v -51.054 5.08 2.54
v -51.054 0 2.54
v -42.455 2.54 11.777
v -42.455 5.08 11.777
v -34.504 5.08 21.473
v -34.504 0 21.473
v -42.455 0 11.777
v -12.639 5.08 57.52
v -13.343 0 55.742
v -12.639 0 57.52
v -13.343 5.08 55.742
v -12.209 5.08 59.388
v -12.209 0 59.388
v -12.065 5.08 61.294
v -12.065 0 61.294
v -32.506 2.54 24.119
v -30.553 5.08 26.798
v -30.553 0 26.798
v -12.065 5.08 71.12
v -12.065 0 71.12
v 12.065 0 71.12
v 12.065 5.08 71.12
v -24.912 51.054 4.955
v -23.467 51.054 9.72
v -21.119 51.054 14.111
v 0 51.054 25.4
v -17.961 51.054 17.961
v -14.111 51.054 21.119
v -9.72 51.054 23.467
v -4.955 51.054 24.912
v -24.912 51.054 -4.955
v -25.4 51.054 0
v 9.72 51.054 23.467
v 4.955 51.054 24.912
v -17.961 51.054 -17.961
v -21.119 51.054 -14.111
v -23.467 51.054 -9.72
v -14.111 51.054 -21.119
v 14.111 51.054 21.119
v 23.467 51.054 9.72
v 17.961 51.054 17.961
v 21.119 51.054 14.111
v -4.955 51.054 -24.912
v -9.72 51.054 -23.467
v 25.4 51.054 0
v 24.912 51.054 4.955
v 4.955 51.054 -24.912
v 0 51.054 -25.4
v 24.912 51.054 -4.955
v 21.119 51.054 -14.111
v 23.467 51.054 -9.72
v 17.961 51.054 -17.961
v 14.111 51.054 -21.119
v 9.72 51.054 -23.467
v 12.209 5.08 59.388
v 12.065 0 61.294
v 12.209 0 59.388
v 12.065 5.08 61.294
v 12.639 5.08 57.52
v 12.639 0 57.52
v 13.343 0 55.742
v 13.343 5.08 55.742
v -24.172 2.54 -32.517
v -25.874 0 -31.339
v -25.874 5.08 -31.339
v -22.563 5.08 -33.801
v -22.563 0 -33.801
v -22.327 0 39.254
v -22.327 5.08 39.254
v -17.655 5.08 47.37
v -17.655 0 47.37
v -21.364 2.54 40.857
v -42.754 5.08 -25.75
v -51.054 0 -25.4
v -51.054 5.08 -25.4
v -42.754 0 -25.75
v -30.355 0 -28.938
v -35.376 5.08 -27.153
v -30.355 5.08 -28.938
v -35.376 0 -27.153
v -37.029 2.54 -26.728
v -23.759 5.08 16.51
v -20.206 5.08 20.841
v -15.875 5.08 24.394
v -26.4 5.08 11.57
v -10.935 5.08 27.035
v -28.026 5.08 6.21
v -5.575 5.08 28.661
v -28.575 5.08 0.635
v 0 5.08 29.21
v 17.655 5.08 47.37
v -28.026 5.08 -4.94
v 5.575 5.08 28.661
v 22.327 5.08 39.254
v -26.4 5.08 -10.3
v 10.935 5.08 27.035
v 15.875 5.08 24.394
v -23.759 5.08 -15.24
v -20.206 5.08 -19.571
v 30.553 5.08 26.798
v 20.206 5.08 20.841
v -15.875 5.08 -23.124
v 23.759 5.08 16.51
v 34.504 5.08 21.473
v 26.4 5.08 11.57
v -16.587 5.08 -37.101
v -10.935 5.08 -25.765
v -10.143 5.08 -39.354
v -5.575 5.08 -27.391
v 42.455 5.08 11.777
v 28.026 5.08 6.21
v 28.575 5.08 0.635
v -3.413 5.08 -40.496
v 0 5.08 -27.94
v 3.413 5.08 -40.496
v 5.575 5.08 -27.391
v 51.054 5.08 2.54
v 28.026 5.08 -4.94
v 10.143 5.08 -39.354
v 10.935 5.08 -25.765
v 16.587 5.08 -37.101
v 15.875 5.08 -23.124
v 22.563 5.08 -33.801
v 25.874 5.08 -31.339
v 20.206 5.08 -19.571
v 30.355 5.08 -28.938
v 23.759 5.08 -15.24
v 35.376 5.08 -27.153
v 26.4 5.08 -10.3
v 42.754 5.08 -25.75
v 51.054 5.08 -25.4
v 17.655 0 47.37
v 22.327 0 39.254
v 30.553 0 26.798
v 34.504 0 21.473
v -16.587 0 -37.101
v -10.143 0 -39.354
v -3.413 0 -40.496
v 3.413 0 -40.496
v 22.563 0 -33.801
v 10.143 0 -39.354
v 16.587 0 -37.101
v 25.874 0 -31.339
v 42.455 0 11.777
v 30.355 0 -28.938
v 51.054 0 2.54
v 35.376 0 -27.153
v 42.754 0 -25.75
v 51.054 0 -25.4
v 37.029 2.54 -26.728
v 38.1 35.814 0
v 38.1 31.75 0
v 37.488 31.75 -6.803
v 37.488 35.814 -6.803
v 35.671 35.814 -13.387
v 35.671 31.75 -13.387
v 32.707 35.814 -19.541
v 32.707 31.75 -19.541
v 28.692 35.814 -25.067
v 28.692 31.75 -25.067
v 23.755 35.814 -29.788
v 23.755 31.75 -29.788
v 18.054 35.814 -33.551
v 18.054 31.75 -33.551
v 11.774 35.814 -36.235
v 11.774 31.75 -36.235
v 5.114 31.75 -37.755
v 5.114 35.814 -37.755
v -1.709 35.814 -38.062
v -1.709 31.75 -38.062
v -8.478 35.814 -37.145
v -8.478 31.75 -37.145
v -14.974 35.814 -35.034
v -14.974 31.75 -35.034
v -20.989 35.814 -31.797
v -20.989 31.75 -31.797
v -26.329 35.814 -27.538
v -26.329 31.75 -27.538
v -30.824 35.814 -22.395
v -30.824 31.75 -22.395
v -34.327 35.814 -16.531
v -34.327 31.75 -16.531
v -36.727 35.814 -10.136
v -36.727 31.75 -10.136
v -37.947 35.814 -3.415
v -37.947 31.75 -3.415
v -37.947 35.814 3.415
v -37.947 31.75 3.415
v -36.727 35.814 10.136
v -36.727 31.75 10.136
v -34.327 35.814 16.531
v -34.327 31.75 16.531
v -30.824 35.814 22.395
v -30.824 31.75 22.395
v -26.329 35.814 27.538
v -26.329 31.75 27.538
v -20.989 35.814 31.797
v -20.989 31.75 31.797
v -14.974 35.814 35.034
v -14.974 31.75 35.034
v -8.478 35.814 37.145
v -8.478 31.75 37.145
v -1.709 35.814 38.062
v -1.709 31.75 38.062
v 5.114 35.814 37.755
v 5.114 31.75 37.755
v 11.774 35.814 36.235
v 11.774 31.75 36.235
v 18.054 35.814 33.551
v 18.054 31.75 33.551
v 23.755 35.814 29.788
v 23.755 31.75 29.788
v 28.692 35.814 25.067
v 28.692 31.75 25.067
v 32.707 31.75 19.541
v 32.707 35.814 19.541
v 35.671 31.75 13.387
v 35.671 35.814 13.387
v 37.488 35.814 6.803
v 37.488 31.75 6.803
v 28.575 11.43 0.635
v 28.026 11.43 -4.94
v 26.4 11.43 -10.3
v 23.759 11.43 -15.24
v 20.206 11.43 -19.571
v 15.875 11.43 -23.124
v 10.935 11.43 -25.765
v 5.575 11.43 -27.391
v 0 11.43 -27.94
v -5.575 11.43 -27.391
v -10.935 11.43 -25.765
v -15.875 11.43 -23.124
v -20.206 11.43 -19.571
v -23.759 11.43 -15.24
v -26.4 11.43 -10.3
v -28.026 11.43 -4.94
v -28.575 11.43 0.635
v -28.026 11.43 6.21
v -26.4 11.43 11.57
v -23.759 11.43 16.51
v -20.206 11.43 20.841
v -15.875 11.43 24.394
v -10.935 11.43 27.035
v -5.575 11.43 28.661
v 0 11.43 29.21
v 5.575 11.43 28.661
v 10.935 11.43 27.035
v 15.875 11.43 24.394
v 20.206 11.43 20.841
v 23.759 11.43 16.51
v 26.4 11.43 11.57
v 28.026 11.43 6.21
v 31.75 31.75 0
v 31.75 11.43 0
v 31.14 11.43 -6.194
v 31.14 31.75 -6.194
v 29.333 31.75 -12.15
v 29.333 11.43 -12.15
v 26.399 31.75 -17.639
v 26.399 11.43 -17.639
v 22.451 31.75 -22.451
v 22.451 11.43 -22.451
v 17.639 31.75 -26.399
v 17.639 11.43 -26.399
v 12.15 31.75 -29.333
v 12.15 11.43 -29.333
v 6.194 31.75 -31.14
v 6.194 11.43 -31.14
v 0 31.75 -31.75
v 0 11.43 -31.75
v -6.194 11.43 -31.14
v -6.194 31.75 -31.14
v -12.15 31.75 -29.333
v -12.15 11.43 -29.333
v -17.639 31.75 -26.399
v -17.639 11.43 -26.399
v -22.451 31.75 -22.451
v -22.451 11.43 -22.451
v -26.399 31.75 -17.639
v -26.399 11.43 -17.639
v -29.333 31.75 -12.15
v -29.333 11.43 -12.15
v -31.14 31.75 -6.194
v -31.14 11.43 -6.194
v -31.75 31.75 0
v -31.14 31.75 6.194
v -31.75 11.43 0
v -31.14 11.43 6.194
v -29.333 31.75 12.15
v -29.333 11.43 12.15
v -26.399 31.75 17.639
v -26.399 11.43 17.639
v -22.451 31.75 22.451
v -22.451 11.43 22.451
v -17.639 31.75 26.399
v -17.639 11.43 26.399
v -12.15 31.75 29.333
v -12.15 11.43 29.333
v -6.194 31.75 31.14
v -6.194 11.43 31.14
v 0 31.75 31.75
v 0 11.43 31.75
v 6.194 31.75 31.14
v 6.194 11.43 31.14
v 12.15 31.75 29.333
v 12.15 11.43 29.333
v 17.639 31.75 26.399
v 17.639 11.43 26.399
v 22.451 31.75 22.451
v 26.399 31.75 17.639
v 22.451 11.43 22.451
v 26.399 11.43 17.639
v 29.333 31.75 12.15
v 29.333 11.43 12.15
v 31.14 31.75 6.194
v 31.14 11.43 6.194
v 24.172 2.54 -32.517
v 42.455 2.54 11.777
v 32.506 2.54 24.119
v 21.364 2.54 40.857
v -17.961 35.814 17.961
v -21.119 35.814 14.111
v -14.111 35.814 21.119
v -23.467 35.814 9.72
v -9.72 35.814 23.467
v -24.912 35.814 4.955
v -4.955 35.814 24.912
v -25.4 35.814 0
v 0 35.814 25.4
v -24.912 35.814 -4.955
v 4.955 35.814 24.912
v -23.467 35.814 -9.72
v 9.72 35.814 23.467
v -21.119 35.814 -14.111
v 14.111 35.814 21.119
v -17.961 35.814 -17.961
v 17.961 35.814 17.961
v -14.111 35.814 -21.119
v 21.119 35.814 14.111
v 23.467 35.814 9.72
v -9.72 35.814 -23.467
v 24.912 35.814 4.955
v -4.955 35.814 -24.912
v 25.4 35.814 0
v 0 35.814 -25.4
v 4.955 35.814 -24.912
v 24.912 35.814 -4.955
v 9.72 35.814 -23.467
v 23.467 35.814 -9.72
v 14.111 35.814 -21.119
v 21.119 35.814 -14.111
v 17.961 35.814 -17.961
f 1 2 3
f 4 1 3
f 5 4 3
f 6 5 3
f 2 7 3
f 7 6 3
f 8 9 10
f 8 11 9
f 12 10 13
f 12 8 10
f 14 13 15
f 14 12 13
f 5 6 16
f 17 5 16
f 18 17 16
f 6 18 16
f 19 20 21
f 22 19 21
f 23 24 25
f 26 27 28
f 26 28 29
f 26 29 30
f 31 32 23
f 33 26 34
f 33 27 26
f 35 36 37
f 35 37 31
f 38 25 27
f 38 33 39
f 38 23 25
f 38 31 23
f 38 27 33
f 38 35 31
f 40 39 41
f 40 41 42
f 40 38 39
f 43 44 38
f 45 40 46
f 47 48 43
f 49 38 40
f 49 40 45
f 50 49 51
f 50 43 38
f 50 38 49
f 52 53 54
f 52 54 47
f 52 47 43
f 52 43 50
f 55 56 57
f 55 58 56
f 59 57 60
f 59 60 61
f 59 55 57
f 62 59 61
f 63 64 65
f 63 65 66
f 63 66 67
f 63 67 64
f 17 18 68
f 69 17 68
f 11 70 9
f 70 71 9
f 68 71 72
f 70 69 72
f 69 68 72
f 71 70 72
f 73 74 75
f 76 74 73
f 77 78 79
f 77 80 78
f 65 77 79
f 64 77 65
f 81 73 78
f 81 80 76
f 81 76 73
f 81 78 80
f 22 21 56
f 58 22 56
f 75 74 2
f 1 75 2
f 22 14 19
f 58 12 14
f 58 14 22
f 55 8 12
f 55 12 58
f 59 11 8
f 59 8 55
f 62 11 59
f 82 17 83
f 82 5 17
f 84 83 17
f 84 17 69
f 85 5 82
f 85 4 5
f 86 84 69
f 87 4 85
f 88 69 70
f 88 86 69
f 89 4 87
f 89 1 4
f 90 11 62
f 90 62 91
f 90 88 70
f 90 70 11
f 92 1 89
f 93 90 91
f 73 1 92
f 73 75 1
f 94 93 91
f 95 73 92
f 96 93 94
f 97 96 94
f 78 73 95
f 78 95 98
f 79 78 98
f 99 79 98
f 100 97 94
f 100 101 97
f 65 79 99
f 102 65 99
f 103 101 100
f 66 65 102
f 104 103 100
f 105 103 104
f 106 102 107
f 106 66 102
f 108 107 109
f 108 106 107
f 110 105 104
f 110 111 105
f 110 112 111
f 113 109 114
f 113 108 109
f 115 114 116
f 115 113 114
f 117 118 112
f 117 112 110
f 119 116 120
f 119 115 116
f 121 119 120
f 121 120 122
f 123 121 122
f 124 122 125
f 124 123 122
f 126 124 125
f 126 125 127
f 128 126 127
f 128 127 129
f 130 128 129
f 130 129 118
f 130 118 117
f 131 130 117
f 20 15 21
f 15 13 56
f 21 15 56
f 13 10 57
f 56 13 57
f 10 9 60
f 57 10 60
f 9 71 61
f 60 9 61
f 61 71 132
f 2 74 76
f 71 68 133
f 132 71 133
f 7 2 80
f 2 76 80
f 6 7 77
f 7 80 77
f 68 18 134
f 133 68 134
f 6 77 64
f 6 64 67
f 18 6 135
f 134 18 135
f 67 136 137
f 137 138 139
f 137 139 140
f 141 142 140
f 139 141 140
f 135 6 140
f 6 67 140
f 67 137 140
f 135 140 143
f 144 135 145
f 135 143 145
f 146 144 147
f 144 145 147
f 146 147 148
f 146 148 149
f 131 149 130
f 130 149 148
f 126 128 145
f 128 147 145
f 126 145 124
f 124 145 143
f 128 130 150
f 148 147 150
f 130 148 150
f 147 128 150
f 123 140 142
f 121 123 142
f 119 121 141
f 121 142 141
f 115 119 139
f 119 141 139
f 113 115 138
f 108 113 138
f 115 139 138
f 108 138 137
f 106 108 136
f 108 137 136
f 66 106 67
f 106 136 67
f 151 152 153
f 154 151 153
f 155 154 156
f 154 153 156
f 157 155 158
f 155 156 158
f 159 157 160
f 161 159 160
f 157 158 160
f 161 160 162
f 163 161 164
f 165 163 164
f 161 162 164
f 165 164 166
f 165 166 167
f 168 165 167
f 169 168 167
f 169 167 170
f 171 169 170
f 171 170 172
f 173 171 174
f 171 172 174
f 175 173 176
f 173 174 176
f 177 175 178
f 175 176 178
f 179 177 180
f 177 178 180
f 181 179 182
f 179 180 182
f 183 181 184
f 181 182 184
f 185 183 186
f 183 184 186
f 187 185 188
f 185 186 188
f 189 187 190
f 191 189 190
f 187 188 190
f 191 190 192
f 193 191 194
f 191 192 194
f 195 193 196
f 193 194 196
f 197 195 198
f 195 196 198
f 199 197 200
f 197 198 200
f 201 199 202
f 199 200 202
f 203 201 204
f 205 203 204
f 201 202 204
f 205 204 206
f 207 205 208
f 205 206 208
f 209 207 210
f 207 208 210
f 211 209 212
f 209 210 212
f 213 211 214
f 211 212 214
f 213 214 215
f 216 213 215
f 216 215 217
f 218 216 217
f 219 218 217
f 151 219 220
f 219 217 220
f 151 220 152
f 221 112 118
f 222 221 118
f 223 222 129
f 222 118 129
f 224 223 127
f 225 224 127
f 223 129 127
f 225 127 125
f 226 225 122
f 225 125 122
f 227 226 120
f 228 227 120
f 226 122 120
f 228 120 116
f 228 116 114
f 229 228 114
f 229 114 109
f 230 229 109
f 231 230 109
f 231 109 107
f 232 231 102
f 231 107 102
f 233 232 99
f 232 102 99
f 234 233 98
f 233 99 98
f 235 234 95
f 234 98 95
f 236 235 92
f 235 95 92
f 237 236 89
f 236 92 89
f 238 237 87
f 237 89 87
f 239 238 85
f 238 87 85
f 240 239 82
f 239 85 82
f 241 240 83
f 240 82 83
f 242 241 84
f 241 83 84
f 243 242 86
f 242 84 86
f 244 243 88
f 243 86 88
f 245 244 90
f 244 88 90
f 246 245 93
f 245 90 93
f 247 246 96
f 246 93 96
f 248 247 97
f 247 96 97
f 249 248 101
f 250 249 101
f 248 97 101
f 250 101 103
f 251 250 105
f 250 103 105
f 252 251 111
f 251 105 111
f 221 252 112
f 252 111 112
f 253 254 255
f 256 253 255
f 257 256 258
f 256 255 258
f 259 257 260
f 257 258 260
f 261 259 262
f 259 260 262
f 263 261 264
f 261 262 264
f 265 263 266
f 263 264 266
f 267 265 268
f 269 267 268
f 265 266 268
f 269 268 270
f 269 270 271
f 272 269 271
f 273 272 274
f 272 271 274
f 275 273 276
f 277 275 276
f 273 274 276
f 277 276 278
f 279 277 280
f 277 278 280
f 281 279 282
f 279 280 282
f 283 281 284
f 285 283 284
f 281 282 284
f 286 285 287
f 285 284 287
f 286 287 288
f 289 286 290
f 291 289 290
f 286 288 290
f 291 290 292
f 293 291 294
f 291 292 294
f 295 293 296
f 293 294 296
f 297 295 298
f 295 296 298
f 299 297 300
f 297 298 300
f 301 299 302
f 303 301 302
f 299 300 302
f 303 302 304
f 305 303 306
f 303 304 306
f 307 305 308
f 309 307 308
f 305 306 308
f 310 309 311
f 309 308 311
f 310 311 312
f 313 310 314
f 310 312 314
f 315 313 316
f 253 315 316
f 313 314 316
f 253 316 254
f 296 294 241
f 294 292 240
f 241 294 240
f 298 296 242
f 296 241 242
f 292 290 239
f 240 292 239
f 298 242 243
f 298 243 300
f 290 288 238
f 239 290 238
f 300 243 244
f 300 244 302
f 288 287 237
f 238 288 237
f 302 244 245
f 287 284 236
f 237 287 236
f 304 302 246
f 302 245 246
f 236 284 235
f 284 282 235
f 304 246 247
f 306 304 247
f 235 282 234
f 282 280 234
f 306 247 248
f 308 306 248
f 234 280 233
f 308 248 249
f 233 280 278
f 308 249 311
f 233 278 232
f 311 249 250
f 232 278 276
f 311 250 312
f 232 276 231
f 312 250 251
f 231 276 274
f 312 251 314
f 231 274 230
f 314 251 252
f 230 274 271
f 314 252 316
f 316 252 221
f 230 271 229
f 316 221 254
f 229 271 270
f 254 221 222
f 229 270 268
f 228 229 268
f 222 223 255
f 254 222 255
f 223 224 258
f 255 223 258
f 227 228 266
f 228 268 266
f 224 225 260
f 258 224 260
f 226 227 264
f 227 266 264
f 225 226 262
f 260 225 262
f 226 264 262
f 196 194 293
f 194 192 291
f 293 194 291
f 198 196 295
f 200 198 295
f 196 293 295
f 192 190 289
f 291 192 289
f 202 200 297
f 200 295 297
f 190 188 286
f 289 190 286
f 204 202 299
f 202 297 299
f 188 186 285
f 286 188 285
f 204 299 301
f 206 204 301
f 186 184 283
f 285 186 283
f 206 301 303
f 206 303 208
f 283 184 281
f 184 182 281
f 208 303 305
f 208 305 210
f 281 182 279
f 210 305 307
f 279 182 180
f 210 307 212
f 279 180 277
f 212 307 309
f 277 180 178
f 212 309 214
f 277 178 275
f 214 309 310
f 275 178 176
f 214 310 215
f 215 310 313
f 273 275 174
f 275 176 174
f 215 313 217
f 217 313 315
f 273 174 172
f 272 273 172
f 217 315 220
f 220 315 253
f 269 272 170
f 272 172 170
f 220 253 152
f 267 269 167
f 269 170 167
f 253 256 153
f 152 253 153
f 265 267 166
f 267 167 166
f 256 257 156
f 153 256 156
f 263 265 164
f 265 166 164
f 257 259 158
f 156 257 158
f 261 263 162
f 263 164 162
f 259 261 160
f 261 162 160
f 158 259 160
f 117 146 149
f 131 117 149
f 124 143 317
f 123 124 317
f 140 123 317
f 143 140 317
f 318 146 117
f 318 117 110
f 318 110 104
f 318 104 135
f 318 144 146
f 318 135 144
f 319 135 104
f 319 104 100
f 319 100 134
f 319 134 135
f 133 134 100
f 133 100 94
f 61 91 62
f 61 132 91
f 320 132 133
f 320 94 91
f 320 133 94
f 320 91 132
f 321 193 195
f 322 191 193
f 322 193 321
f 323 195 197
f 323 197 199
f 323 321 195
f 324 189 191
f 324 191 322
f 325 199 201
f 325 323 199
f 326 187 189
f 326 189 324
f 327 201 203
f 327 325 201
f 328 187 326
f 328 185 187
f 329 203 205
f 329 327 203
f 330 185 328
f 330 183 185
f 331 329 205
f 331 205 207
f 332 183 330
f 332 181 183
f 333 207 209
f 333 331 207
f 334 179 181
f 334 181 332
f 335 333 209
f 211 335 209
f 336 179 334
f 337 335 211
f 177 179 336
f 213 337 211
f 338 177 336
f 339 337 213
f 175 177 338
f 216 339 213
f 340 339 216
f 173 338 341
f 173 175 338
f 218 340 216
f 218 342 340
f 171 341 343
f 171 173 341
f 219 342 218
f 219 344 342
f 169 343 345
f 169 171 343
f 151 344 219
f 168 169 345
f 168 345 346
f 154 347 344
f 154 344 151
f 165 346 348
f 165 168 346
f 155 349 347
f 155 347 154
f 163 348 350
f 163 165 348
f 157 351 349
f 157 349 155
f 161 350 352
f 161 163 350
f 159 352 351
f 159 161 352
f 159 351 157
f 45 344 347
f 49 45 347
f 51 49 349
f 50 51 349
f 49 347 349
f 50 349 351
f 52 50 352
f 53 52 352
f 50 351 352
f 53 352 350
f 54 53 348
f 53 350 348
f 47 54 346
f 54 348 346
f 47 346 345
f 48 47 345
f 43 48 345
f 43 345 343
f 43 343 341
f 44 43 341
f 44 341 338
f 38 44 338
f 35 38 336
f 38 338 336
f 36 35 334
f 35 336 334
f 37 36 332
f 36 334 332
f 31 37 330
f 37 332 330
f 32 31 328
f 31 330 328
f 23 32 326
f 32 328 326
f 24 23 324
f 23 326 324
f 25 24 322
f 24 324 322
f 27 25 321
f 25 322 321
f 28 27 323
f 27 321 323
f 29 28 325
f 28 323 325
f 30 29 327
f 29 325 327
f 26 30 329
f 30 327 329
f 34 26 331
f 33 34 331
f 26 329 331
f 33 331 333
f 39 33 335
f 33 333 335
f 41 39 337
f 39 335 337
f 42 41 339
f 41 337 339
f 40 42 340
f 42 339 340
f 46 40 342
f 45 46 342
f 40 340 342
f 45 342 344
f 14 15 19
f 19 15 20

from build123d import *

# Parameters (mm, degrees)
BOSS_EXTRUDE1_DEPTH = 5.08
FILLET1_R           = 12.7
FILLET2_R           = 12.7
SKETCH2_R           = 28.575
BOSS_EXTRUDE2_DEPTH = 6.35
SKETCH3_R           = 31.75
BOSS_EXTRUDE3_DEPTH = 20.32
SKETCH4_R           = 38.1
BOSS_EXTRUDE4_DEPTH = 4.064
SKETCH5_R           = 25.4
BOSS_EXTRUDE5_DEPTH = 15.24


with BuildPart() as part:
    # Sketch1 → Boss-Extrude1 (new body)
    with BuildSketch(Plane(origin=(0, 0, 0), x_dir=(1, 0, 0), z_dir=(0, 1, 0))):
        with BuildLine():
            Line((51.054, -2.54), (51.054, 0))
            Line((51.054, 0), (51.054, 25.4))
            add(Edge.make_bspline(
                [(51.054, 25.4), (35.593374206, 25.086699202), (25.873960254, 31.339237081)],
                knots=[0, 0, 0, 0.413959763, 0.413959763, 0.413959763], degree=2))
            add(Edge.make_bspline(
                [(25.873960254, 31.339237081), (24.125496917, 32.46403054), (22.562829629, 33.80130647)],
                knots=[0.413959763, 0.413959763, 0.413959763, 0.488428602, 0.488428602, 0.488428602], degree=2))
            ThreePointArc((22.562829629, 33.80130647), (0, 40.64), (-22.562829629, 33.80130647))
            add(Edge.make_bspline(
                [(-25.873960254, 31.339237081), (-24.125496917, 32.46403054), (-22.562829629, 33.80130647)],
                knots=[0.413959763, 0.413959763, 0.413959763, 0.488428602, 0.488428602, 0.488428602], degree=2))
            add(Edge.make_bspline(
                [(-51.054, 25.4), (-35.593374206, 25.086699202), (-25.873960254, 31.339237081)],
                knots=[0, 0, 0, 0.413959763, 0.413959763, 0.413959763], degree=2))
            Line((-51.054, 25.4), (-51.054, 0))
            Line((-51.054, 0), (-51.054, -2.54))
            add(Edge.make_bspline(
                [(-51.054, -2.54), (-42.130232366, -11.547896864), (-34.503914612, -21.472994119)],
                knots=[0, 0, 0, 0.367111941, 0.367111941, 0.367111941], degree=2))
            add(Edge.make_bspline(
                [(-34.503914612, -21.472994119), (-32.482868864, -24.103237999), (-30.552942986, -26.797896838)],
                knots=[0.367111941, 0.367111941, 0.367111941, 0.46440005, 0.46440005, 0.46440005], degree=2))
            add(Edge.make_bspline(
                [(-30.552942986, -26.797896838), (-19.928127461, -41.632794577), (-12.065, -58.42)],
                knots=[0.46440005, 0.46440005, 0.46440005, 1, 1, 1], degree=2))
            Line((-12.065, -58.42), (-12.065, -71.12))
            Line((-12.065, -71.12), (12.065, -71.12))
            Line((12.065, -71.12), (12.065, -58.42))
            add(Edge.make_bspline(
                [(30.552942986, -26.797896838), (19.928127461, -41.632794577), (12.065, -58.42)],
                knots=[0.46440005, 0.46440005, 0.46440005, 1, 1, 1], degree=2))
            add(Edge.make_bspline(
                [(34.503914612, -21.472994119), (32.482868864, -24.103237999), (30.552942986, -26.797896838)],
                knots=[0.367111941, 0.367111941, 0.367111941, 0.46440005, 0.46440005, 0.46440005], degree=2))
            add(Edge.make_bspline(
                [(51.054, -2.54), (42.130232366, -11.547896864), (34.503914612, -21.472994119)],
                knots=[0, 0, 0, 0.367111941, 0.367111941, 0.367111941], degree=2))
        make_face()
    extrude(amount=BOSS_EXTRUDE1_DEPTH)

    # Fillet1
    fillet1_edges = [part.edges().sort_by_distance(p)[0] for p in [
        (-12.065, 2.54, 58.42),
    ]]
    fillet(fillet1_edges, radius=FILLET1_R)

    # Fillet2
    fillet2_edges = [part.edges().sort_by_distance(p)[0] for p in [
        (12.065, 2.54, 58.42),
    ]]
    fillet(fillet2_edges, radius=FILLET2_R)

    # Sketch2 → Boss-Extrude2 (add)
    with BuildSketch(Plane(origin=(0, 5.08, 0), x_dir=(1, 0, 0), z_dir=(0, 1, 0))):
        with Locations((0, -0.635)):
            Circle(SKETCH2_R)
    extrude(amount=BOSS_EXTRUDE2_DEPTH)

    # Sketch3 → Boss-Extrude3 (add)
    with BuildSketch(Plane(origin=(0, 11.43, 0), x_dir=(1, 0, 0), z_dir=(0, 1, 0))):
        Circle(SKETCH3_R)
    extrude(amount=BOSS_EXTRUDE3_DEPTH)

    # Sketch4 → Boss-Extrude4 (add)
    with BuildSketch(Plane(origin=(0, 31.75, 0), x_dir=(1, 0, 0), z_dir=(0, 1, 0))):
        Circle(SKETCH4_R)
    extrude(amount=BOSS_EXTRUDE4_DEPTH)

    # Sketch5 → Boss-Extrude5 (add)
    with BuildSketch(Plane(origin=(0, 35.814, 0), x_dir=(1, 0, 0), z_dir=(0, 1, 0))):
        Circle(SKETCH5_R)
    extrude(amount=BOSS_EXTRUDE5_DEPTH)


solid = part.part
